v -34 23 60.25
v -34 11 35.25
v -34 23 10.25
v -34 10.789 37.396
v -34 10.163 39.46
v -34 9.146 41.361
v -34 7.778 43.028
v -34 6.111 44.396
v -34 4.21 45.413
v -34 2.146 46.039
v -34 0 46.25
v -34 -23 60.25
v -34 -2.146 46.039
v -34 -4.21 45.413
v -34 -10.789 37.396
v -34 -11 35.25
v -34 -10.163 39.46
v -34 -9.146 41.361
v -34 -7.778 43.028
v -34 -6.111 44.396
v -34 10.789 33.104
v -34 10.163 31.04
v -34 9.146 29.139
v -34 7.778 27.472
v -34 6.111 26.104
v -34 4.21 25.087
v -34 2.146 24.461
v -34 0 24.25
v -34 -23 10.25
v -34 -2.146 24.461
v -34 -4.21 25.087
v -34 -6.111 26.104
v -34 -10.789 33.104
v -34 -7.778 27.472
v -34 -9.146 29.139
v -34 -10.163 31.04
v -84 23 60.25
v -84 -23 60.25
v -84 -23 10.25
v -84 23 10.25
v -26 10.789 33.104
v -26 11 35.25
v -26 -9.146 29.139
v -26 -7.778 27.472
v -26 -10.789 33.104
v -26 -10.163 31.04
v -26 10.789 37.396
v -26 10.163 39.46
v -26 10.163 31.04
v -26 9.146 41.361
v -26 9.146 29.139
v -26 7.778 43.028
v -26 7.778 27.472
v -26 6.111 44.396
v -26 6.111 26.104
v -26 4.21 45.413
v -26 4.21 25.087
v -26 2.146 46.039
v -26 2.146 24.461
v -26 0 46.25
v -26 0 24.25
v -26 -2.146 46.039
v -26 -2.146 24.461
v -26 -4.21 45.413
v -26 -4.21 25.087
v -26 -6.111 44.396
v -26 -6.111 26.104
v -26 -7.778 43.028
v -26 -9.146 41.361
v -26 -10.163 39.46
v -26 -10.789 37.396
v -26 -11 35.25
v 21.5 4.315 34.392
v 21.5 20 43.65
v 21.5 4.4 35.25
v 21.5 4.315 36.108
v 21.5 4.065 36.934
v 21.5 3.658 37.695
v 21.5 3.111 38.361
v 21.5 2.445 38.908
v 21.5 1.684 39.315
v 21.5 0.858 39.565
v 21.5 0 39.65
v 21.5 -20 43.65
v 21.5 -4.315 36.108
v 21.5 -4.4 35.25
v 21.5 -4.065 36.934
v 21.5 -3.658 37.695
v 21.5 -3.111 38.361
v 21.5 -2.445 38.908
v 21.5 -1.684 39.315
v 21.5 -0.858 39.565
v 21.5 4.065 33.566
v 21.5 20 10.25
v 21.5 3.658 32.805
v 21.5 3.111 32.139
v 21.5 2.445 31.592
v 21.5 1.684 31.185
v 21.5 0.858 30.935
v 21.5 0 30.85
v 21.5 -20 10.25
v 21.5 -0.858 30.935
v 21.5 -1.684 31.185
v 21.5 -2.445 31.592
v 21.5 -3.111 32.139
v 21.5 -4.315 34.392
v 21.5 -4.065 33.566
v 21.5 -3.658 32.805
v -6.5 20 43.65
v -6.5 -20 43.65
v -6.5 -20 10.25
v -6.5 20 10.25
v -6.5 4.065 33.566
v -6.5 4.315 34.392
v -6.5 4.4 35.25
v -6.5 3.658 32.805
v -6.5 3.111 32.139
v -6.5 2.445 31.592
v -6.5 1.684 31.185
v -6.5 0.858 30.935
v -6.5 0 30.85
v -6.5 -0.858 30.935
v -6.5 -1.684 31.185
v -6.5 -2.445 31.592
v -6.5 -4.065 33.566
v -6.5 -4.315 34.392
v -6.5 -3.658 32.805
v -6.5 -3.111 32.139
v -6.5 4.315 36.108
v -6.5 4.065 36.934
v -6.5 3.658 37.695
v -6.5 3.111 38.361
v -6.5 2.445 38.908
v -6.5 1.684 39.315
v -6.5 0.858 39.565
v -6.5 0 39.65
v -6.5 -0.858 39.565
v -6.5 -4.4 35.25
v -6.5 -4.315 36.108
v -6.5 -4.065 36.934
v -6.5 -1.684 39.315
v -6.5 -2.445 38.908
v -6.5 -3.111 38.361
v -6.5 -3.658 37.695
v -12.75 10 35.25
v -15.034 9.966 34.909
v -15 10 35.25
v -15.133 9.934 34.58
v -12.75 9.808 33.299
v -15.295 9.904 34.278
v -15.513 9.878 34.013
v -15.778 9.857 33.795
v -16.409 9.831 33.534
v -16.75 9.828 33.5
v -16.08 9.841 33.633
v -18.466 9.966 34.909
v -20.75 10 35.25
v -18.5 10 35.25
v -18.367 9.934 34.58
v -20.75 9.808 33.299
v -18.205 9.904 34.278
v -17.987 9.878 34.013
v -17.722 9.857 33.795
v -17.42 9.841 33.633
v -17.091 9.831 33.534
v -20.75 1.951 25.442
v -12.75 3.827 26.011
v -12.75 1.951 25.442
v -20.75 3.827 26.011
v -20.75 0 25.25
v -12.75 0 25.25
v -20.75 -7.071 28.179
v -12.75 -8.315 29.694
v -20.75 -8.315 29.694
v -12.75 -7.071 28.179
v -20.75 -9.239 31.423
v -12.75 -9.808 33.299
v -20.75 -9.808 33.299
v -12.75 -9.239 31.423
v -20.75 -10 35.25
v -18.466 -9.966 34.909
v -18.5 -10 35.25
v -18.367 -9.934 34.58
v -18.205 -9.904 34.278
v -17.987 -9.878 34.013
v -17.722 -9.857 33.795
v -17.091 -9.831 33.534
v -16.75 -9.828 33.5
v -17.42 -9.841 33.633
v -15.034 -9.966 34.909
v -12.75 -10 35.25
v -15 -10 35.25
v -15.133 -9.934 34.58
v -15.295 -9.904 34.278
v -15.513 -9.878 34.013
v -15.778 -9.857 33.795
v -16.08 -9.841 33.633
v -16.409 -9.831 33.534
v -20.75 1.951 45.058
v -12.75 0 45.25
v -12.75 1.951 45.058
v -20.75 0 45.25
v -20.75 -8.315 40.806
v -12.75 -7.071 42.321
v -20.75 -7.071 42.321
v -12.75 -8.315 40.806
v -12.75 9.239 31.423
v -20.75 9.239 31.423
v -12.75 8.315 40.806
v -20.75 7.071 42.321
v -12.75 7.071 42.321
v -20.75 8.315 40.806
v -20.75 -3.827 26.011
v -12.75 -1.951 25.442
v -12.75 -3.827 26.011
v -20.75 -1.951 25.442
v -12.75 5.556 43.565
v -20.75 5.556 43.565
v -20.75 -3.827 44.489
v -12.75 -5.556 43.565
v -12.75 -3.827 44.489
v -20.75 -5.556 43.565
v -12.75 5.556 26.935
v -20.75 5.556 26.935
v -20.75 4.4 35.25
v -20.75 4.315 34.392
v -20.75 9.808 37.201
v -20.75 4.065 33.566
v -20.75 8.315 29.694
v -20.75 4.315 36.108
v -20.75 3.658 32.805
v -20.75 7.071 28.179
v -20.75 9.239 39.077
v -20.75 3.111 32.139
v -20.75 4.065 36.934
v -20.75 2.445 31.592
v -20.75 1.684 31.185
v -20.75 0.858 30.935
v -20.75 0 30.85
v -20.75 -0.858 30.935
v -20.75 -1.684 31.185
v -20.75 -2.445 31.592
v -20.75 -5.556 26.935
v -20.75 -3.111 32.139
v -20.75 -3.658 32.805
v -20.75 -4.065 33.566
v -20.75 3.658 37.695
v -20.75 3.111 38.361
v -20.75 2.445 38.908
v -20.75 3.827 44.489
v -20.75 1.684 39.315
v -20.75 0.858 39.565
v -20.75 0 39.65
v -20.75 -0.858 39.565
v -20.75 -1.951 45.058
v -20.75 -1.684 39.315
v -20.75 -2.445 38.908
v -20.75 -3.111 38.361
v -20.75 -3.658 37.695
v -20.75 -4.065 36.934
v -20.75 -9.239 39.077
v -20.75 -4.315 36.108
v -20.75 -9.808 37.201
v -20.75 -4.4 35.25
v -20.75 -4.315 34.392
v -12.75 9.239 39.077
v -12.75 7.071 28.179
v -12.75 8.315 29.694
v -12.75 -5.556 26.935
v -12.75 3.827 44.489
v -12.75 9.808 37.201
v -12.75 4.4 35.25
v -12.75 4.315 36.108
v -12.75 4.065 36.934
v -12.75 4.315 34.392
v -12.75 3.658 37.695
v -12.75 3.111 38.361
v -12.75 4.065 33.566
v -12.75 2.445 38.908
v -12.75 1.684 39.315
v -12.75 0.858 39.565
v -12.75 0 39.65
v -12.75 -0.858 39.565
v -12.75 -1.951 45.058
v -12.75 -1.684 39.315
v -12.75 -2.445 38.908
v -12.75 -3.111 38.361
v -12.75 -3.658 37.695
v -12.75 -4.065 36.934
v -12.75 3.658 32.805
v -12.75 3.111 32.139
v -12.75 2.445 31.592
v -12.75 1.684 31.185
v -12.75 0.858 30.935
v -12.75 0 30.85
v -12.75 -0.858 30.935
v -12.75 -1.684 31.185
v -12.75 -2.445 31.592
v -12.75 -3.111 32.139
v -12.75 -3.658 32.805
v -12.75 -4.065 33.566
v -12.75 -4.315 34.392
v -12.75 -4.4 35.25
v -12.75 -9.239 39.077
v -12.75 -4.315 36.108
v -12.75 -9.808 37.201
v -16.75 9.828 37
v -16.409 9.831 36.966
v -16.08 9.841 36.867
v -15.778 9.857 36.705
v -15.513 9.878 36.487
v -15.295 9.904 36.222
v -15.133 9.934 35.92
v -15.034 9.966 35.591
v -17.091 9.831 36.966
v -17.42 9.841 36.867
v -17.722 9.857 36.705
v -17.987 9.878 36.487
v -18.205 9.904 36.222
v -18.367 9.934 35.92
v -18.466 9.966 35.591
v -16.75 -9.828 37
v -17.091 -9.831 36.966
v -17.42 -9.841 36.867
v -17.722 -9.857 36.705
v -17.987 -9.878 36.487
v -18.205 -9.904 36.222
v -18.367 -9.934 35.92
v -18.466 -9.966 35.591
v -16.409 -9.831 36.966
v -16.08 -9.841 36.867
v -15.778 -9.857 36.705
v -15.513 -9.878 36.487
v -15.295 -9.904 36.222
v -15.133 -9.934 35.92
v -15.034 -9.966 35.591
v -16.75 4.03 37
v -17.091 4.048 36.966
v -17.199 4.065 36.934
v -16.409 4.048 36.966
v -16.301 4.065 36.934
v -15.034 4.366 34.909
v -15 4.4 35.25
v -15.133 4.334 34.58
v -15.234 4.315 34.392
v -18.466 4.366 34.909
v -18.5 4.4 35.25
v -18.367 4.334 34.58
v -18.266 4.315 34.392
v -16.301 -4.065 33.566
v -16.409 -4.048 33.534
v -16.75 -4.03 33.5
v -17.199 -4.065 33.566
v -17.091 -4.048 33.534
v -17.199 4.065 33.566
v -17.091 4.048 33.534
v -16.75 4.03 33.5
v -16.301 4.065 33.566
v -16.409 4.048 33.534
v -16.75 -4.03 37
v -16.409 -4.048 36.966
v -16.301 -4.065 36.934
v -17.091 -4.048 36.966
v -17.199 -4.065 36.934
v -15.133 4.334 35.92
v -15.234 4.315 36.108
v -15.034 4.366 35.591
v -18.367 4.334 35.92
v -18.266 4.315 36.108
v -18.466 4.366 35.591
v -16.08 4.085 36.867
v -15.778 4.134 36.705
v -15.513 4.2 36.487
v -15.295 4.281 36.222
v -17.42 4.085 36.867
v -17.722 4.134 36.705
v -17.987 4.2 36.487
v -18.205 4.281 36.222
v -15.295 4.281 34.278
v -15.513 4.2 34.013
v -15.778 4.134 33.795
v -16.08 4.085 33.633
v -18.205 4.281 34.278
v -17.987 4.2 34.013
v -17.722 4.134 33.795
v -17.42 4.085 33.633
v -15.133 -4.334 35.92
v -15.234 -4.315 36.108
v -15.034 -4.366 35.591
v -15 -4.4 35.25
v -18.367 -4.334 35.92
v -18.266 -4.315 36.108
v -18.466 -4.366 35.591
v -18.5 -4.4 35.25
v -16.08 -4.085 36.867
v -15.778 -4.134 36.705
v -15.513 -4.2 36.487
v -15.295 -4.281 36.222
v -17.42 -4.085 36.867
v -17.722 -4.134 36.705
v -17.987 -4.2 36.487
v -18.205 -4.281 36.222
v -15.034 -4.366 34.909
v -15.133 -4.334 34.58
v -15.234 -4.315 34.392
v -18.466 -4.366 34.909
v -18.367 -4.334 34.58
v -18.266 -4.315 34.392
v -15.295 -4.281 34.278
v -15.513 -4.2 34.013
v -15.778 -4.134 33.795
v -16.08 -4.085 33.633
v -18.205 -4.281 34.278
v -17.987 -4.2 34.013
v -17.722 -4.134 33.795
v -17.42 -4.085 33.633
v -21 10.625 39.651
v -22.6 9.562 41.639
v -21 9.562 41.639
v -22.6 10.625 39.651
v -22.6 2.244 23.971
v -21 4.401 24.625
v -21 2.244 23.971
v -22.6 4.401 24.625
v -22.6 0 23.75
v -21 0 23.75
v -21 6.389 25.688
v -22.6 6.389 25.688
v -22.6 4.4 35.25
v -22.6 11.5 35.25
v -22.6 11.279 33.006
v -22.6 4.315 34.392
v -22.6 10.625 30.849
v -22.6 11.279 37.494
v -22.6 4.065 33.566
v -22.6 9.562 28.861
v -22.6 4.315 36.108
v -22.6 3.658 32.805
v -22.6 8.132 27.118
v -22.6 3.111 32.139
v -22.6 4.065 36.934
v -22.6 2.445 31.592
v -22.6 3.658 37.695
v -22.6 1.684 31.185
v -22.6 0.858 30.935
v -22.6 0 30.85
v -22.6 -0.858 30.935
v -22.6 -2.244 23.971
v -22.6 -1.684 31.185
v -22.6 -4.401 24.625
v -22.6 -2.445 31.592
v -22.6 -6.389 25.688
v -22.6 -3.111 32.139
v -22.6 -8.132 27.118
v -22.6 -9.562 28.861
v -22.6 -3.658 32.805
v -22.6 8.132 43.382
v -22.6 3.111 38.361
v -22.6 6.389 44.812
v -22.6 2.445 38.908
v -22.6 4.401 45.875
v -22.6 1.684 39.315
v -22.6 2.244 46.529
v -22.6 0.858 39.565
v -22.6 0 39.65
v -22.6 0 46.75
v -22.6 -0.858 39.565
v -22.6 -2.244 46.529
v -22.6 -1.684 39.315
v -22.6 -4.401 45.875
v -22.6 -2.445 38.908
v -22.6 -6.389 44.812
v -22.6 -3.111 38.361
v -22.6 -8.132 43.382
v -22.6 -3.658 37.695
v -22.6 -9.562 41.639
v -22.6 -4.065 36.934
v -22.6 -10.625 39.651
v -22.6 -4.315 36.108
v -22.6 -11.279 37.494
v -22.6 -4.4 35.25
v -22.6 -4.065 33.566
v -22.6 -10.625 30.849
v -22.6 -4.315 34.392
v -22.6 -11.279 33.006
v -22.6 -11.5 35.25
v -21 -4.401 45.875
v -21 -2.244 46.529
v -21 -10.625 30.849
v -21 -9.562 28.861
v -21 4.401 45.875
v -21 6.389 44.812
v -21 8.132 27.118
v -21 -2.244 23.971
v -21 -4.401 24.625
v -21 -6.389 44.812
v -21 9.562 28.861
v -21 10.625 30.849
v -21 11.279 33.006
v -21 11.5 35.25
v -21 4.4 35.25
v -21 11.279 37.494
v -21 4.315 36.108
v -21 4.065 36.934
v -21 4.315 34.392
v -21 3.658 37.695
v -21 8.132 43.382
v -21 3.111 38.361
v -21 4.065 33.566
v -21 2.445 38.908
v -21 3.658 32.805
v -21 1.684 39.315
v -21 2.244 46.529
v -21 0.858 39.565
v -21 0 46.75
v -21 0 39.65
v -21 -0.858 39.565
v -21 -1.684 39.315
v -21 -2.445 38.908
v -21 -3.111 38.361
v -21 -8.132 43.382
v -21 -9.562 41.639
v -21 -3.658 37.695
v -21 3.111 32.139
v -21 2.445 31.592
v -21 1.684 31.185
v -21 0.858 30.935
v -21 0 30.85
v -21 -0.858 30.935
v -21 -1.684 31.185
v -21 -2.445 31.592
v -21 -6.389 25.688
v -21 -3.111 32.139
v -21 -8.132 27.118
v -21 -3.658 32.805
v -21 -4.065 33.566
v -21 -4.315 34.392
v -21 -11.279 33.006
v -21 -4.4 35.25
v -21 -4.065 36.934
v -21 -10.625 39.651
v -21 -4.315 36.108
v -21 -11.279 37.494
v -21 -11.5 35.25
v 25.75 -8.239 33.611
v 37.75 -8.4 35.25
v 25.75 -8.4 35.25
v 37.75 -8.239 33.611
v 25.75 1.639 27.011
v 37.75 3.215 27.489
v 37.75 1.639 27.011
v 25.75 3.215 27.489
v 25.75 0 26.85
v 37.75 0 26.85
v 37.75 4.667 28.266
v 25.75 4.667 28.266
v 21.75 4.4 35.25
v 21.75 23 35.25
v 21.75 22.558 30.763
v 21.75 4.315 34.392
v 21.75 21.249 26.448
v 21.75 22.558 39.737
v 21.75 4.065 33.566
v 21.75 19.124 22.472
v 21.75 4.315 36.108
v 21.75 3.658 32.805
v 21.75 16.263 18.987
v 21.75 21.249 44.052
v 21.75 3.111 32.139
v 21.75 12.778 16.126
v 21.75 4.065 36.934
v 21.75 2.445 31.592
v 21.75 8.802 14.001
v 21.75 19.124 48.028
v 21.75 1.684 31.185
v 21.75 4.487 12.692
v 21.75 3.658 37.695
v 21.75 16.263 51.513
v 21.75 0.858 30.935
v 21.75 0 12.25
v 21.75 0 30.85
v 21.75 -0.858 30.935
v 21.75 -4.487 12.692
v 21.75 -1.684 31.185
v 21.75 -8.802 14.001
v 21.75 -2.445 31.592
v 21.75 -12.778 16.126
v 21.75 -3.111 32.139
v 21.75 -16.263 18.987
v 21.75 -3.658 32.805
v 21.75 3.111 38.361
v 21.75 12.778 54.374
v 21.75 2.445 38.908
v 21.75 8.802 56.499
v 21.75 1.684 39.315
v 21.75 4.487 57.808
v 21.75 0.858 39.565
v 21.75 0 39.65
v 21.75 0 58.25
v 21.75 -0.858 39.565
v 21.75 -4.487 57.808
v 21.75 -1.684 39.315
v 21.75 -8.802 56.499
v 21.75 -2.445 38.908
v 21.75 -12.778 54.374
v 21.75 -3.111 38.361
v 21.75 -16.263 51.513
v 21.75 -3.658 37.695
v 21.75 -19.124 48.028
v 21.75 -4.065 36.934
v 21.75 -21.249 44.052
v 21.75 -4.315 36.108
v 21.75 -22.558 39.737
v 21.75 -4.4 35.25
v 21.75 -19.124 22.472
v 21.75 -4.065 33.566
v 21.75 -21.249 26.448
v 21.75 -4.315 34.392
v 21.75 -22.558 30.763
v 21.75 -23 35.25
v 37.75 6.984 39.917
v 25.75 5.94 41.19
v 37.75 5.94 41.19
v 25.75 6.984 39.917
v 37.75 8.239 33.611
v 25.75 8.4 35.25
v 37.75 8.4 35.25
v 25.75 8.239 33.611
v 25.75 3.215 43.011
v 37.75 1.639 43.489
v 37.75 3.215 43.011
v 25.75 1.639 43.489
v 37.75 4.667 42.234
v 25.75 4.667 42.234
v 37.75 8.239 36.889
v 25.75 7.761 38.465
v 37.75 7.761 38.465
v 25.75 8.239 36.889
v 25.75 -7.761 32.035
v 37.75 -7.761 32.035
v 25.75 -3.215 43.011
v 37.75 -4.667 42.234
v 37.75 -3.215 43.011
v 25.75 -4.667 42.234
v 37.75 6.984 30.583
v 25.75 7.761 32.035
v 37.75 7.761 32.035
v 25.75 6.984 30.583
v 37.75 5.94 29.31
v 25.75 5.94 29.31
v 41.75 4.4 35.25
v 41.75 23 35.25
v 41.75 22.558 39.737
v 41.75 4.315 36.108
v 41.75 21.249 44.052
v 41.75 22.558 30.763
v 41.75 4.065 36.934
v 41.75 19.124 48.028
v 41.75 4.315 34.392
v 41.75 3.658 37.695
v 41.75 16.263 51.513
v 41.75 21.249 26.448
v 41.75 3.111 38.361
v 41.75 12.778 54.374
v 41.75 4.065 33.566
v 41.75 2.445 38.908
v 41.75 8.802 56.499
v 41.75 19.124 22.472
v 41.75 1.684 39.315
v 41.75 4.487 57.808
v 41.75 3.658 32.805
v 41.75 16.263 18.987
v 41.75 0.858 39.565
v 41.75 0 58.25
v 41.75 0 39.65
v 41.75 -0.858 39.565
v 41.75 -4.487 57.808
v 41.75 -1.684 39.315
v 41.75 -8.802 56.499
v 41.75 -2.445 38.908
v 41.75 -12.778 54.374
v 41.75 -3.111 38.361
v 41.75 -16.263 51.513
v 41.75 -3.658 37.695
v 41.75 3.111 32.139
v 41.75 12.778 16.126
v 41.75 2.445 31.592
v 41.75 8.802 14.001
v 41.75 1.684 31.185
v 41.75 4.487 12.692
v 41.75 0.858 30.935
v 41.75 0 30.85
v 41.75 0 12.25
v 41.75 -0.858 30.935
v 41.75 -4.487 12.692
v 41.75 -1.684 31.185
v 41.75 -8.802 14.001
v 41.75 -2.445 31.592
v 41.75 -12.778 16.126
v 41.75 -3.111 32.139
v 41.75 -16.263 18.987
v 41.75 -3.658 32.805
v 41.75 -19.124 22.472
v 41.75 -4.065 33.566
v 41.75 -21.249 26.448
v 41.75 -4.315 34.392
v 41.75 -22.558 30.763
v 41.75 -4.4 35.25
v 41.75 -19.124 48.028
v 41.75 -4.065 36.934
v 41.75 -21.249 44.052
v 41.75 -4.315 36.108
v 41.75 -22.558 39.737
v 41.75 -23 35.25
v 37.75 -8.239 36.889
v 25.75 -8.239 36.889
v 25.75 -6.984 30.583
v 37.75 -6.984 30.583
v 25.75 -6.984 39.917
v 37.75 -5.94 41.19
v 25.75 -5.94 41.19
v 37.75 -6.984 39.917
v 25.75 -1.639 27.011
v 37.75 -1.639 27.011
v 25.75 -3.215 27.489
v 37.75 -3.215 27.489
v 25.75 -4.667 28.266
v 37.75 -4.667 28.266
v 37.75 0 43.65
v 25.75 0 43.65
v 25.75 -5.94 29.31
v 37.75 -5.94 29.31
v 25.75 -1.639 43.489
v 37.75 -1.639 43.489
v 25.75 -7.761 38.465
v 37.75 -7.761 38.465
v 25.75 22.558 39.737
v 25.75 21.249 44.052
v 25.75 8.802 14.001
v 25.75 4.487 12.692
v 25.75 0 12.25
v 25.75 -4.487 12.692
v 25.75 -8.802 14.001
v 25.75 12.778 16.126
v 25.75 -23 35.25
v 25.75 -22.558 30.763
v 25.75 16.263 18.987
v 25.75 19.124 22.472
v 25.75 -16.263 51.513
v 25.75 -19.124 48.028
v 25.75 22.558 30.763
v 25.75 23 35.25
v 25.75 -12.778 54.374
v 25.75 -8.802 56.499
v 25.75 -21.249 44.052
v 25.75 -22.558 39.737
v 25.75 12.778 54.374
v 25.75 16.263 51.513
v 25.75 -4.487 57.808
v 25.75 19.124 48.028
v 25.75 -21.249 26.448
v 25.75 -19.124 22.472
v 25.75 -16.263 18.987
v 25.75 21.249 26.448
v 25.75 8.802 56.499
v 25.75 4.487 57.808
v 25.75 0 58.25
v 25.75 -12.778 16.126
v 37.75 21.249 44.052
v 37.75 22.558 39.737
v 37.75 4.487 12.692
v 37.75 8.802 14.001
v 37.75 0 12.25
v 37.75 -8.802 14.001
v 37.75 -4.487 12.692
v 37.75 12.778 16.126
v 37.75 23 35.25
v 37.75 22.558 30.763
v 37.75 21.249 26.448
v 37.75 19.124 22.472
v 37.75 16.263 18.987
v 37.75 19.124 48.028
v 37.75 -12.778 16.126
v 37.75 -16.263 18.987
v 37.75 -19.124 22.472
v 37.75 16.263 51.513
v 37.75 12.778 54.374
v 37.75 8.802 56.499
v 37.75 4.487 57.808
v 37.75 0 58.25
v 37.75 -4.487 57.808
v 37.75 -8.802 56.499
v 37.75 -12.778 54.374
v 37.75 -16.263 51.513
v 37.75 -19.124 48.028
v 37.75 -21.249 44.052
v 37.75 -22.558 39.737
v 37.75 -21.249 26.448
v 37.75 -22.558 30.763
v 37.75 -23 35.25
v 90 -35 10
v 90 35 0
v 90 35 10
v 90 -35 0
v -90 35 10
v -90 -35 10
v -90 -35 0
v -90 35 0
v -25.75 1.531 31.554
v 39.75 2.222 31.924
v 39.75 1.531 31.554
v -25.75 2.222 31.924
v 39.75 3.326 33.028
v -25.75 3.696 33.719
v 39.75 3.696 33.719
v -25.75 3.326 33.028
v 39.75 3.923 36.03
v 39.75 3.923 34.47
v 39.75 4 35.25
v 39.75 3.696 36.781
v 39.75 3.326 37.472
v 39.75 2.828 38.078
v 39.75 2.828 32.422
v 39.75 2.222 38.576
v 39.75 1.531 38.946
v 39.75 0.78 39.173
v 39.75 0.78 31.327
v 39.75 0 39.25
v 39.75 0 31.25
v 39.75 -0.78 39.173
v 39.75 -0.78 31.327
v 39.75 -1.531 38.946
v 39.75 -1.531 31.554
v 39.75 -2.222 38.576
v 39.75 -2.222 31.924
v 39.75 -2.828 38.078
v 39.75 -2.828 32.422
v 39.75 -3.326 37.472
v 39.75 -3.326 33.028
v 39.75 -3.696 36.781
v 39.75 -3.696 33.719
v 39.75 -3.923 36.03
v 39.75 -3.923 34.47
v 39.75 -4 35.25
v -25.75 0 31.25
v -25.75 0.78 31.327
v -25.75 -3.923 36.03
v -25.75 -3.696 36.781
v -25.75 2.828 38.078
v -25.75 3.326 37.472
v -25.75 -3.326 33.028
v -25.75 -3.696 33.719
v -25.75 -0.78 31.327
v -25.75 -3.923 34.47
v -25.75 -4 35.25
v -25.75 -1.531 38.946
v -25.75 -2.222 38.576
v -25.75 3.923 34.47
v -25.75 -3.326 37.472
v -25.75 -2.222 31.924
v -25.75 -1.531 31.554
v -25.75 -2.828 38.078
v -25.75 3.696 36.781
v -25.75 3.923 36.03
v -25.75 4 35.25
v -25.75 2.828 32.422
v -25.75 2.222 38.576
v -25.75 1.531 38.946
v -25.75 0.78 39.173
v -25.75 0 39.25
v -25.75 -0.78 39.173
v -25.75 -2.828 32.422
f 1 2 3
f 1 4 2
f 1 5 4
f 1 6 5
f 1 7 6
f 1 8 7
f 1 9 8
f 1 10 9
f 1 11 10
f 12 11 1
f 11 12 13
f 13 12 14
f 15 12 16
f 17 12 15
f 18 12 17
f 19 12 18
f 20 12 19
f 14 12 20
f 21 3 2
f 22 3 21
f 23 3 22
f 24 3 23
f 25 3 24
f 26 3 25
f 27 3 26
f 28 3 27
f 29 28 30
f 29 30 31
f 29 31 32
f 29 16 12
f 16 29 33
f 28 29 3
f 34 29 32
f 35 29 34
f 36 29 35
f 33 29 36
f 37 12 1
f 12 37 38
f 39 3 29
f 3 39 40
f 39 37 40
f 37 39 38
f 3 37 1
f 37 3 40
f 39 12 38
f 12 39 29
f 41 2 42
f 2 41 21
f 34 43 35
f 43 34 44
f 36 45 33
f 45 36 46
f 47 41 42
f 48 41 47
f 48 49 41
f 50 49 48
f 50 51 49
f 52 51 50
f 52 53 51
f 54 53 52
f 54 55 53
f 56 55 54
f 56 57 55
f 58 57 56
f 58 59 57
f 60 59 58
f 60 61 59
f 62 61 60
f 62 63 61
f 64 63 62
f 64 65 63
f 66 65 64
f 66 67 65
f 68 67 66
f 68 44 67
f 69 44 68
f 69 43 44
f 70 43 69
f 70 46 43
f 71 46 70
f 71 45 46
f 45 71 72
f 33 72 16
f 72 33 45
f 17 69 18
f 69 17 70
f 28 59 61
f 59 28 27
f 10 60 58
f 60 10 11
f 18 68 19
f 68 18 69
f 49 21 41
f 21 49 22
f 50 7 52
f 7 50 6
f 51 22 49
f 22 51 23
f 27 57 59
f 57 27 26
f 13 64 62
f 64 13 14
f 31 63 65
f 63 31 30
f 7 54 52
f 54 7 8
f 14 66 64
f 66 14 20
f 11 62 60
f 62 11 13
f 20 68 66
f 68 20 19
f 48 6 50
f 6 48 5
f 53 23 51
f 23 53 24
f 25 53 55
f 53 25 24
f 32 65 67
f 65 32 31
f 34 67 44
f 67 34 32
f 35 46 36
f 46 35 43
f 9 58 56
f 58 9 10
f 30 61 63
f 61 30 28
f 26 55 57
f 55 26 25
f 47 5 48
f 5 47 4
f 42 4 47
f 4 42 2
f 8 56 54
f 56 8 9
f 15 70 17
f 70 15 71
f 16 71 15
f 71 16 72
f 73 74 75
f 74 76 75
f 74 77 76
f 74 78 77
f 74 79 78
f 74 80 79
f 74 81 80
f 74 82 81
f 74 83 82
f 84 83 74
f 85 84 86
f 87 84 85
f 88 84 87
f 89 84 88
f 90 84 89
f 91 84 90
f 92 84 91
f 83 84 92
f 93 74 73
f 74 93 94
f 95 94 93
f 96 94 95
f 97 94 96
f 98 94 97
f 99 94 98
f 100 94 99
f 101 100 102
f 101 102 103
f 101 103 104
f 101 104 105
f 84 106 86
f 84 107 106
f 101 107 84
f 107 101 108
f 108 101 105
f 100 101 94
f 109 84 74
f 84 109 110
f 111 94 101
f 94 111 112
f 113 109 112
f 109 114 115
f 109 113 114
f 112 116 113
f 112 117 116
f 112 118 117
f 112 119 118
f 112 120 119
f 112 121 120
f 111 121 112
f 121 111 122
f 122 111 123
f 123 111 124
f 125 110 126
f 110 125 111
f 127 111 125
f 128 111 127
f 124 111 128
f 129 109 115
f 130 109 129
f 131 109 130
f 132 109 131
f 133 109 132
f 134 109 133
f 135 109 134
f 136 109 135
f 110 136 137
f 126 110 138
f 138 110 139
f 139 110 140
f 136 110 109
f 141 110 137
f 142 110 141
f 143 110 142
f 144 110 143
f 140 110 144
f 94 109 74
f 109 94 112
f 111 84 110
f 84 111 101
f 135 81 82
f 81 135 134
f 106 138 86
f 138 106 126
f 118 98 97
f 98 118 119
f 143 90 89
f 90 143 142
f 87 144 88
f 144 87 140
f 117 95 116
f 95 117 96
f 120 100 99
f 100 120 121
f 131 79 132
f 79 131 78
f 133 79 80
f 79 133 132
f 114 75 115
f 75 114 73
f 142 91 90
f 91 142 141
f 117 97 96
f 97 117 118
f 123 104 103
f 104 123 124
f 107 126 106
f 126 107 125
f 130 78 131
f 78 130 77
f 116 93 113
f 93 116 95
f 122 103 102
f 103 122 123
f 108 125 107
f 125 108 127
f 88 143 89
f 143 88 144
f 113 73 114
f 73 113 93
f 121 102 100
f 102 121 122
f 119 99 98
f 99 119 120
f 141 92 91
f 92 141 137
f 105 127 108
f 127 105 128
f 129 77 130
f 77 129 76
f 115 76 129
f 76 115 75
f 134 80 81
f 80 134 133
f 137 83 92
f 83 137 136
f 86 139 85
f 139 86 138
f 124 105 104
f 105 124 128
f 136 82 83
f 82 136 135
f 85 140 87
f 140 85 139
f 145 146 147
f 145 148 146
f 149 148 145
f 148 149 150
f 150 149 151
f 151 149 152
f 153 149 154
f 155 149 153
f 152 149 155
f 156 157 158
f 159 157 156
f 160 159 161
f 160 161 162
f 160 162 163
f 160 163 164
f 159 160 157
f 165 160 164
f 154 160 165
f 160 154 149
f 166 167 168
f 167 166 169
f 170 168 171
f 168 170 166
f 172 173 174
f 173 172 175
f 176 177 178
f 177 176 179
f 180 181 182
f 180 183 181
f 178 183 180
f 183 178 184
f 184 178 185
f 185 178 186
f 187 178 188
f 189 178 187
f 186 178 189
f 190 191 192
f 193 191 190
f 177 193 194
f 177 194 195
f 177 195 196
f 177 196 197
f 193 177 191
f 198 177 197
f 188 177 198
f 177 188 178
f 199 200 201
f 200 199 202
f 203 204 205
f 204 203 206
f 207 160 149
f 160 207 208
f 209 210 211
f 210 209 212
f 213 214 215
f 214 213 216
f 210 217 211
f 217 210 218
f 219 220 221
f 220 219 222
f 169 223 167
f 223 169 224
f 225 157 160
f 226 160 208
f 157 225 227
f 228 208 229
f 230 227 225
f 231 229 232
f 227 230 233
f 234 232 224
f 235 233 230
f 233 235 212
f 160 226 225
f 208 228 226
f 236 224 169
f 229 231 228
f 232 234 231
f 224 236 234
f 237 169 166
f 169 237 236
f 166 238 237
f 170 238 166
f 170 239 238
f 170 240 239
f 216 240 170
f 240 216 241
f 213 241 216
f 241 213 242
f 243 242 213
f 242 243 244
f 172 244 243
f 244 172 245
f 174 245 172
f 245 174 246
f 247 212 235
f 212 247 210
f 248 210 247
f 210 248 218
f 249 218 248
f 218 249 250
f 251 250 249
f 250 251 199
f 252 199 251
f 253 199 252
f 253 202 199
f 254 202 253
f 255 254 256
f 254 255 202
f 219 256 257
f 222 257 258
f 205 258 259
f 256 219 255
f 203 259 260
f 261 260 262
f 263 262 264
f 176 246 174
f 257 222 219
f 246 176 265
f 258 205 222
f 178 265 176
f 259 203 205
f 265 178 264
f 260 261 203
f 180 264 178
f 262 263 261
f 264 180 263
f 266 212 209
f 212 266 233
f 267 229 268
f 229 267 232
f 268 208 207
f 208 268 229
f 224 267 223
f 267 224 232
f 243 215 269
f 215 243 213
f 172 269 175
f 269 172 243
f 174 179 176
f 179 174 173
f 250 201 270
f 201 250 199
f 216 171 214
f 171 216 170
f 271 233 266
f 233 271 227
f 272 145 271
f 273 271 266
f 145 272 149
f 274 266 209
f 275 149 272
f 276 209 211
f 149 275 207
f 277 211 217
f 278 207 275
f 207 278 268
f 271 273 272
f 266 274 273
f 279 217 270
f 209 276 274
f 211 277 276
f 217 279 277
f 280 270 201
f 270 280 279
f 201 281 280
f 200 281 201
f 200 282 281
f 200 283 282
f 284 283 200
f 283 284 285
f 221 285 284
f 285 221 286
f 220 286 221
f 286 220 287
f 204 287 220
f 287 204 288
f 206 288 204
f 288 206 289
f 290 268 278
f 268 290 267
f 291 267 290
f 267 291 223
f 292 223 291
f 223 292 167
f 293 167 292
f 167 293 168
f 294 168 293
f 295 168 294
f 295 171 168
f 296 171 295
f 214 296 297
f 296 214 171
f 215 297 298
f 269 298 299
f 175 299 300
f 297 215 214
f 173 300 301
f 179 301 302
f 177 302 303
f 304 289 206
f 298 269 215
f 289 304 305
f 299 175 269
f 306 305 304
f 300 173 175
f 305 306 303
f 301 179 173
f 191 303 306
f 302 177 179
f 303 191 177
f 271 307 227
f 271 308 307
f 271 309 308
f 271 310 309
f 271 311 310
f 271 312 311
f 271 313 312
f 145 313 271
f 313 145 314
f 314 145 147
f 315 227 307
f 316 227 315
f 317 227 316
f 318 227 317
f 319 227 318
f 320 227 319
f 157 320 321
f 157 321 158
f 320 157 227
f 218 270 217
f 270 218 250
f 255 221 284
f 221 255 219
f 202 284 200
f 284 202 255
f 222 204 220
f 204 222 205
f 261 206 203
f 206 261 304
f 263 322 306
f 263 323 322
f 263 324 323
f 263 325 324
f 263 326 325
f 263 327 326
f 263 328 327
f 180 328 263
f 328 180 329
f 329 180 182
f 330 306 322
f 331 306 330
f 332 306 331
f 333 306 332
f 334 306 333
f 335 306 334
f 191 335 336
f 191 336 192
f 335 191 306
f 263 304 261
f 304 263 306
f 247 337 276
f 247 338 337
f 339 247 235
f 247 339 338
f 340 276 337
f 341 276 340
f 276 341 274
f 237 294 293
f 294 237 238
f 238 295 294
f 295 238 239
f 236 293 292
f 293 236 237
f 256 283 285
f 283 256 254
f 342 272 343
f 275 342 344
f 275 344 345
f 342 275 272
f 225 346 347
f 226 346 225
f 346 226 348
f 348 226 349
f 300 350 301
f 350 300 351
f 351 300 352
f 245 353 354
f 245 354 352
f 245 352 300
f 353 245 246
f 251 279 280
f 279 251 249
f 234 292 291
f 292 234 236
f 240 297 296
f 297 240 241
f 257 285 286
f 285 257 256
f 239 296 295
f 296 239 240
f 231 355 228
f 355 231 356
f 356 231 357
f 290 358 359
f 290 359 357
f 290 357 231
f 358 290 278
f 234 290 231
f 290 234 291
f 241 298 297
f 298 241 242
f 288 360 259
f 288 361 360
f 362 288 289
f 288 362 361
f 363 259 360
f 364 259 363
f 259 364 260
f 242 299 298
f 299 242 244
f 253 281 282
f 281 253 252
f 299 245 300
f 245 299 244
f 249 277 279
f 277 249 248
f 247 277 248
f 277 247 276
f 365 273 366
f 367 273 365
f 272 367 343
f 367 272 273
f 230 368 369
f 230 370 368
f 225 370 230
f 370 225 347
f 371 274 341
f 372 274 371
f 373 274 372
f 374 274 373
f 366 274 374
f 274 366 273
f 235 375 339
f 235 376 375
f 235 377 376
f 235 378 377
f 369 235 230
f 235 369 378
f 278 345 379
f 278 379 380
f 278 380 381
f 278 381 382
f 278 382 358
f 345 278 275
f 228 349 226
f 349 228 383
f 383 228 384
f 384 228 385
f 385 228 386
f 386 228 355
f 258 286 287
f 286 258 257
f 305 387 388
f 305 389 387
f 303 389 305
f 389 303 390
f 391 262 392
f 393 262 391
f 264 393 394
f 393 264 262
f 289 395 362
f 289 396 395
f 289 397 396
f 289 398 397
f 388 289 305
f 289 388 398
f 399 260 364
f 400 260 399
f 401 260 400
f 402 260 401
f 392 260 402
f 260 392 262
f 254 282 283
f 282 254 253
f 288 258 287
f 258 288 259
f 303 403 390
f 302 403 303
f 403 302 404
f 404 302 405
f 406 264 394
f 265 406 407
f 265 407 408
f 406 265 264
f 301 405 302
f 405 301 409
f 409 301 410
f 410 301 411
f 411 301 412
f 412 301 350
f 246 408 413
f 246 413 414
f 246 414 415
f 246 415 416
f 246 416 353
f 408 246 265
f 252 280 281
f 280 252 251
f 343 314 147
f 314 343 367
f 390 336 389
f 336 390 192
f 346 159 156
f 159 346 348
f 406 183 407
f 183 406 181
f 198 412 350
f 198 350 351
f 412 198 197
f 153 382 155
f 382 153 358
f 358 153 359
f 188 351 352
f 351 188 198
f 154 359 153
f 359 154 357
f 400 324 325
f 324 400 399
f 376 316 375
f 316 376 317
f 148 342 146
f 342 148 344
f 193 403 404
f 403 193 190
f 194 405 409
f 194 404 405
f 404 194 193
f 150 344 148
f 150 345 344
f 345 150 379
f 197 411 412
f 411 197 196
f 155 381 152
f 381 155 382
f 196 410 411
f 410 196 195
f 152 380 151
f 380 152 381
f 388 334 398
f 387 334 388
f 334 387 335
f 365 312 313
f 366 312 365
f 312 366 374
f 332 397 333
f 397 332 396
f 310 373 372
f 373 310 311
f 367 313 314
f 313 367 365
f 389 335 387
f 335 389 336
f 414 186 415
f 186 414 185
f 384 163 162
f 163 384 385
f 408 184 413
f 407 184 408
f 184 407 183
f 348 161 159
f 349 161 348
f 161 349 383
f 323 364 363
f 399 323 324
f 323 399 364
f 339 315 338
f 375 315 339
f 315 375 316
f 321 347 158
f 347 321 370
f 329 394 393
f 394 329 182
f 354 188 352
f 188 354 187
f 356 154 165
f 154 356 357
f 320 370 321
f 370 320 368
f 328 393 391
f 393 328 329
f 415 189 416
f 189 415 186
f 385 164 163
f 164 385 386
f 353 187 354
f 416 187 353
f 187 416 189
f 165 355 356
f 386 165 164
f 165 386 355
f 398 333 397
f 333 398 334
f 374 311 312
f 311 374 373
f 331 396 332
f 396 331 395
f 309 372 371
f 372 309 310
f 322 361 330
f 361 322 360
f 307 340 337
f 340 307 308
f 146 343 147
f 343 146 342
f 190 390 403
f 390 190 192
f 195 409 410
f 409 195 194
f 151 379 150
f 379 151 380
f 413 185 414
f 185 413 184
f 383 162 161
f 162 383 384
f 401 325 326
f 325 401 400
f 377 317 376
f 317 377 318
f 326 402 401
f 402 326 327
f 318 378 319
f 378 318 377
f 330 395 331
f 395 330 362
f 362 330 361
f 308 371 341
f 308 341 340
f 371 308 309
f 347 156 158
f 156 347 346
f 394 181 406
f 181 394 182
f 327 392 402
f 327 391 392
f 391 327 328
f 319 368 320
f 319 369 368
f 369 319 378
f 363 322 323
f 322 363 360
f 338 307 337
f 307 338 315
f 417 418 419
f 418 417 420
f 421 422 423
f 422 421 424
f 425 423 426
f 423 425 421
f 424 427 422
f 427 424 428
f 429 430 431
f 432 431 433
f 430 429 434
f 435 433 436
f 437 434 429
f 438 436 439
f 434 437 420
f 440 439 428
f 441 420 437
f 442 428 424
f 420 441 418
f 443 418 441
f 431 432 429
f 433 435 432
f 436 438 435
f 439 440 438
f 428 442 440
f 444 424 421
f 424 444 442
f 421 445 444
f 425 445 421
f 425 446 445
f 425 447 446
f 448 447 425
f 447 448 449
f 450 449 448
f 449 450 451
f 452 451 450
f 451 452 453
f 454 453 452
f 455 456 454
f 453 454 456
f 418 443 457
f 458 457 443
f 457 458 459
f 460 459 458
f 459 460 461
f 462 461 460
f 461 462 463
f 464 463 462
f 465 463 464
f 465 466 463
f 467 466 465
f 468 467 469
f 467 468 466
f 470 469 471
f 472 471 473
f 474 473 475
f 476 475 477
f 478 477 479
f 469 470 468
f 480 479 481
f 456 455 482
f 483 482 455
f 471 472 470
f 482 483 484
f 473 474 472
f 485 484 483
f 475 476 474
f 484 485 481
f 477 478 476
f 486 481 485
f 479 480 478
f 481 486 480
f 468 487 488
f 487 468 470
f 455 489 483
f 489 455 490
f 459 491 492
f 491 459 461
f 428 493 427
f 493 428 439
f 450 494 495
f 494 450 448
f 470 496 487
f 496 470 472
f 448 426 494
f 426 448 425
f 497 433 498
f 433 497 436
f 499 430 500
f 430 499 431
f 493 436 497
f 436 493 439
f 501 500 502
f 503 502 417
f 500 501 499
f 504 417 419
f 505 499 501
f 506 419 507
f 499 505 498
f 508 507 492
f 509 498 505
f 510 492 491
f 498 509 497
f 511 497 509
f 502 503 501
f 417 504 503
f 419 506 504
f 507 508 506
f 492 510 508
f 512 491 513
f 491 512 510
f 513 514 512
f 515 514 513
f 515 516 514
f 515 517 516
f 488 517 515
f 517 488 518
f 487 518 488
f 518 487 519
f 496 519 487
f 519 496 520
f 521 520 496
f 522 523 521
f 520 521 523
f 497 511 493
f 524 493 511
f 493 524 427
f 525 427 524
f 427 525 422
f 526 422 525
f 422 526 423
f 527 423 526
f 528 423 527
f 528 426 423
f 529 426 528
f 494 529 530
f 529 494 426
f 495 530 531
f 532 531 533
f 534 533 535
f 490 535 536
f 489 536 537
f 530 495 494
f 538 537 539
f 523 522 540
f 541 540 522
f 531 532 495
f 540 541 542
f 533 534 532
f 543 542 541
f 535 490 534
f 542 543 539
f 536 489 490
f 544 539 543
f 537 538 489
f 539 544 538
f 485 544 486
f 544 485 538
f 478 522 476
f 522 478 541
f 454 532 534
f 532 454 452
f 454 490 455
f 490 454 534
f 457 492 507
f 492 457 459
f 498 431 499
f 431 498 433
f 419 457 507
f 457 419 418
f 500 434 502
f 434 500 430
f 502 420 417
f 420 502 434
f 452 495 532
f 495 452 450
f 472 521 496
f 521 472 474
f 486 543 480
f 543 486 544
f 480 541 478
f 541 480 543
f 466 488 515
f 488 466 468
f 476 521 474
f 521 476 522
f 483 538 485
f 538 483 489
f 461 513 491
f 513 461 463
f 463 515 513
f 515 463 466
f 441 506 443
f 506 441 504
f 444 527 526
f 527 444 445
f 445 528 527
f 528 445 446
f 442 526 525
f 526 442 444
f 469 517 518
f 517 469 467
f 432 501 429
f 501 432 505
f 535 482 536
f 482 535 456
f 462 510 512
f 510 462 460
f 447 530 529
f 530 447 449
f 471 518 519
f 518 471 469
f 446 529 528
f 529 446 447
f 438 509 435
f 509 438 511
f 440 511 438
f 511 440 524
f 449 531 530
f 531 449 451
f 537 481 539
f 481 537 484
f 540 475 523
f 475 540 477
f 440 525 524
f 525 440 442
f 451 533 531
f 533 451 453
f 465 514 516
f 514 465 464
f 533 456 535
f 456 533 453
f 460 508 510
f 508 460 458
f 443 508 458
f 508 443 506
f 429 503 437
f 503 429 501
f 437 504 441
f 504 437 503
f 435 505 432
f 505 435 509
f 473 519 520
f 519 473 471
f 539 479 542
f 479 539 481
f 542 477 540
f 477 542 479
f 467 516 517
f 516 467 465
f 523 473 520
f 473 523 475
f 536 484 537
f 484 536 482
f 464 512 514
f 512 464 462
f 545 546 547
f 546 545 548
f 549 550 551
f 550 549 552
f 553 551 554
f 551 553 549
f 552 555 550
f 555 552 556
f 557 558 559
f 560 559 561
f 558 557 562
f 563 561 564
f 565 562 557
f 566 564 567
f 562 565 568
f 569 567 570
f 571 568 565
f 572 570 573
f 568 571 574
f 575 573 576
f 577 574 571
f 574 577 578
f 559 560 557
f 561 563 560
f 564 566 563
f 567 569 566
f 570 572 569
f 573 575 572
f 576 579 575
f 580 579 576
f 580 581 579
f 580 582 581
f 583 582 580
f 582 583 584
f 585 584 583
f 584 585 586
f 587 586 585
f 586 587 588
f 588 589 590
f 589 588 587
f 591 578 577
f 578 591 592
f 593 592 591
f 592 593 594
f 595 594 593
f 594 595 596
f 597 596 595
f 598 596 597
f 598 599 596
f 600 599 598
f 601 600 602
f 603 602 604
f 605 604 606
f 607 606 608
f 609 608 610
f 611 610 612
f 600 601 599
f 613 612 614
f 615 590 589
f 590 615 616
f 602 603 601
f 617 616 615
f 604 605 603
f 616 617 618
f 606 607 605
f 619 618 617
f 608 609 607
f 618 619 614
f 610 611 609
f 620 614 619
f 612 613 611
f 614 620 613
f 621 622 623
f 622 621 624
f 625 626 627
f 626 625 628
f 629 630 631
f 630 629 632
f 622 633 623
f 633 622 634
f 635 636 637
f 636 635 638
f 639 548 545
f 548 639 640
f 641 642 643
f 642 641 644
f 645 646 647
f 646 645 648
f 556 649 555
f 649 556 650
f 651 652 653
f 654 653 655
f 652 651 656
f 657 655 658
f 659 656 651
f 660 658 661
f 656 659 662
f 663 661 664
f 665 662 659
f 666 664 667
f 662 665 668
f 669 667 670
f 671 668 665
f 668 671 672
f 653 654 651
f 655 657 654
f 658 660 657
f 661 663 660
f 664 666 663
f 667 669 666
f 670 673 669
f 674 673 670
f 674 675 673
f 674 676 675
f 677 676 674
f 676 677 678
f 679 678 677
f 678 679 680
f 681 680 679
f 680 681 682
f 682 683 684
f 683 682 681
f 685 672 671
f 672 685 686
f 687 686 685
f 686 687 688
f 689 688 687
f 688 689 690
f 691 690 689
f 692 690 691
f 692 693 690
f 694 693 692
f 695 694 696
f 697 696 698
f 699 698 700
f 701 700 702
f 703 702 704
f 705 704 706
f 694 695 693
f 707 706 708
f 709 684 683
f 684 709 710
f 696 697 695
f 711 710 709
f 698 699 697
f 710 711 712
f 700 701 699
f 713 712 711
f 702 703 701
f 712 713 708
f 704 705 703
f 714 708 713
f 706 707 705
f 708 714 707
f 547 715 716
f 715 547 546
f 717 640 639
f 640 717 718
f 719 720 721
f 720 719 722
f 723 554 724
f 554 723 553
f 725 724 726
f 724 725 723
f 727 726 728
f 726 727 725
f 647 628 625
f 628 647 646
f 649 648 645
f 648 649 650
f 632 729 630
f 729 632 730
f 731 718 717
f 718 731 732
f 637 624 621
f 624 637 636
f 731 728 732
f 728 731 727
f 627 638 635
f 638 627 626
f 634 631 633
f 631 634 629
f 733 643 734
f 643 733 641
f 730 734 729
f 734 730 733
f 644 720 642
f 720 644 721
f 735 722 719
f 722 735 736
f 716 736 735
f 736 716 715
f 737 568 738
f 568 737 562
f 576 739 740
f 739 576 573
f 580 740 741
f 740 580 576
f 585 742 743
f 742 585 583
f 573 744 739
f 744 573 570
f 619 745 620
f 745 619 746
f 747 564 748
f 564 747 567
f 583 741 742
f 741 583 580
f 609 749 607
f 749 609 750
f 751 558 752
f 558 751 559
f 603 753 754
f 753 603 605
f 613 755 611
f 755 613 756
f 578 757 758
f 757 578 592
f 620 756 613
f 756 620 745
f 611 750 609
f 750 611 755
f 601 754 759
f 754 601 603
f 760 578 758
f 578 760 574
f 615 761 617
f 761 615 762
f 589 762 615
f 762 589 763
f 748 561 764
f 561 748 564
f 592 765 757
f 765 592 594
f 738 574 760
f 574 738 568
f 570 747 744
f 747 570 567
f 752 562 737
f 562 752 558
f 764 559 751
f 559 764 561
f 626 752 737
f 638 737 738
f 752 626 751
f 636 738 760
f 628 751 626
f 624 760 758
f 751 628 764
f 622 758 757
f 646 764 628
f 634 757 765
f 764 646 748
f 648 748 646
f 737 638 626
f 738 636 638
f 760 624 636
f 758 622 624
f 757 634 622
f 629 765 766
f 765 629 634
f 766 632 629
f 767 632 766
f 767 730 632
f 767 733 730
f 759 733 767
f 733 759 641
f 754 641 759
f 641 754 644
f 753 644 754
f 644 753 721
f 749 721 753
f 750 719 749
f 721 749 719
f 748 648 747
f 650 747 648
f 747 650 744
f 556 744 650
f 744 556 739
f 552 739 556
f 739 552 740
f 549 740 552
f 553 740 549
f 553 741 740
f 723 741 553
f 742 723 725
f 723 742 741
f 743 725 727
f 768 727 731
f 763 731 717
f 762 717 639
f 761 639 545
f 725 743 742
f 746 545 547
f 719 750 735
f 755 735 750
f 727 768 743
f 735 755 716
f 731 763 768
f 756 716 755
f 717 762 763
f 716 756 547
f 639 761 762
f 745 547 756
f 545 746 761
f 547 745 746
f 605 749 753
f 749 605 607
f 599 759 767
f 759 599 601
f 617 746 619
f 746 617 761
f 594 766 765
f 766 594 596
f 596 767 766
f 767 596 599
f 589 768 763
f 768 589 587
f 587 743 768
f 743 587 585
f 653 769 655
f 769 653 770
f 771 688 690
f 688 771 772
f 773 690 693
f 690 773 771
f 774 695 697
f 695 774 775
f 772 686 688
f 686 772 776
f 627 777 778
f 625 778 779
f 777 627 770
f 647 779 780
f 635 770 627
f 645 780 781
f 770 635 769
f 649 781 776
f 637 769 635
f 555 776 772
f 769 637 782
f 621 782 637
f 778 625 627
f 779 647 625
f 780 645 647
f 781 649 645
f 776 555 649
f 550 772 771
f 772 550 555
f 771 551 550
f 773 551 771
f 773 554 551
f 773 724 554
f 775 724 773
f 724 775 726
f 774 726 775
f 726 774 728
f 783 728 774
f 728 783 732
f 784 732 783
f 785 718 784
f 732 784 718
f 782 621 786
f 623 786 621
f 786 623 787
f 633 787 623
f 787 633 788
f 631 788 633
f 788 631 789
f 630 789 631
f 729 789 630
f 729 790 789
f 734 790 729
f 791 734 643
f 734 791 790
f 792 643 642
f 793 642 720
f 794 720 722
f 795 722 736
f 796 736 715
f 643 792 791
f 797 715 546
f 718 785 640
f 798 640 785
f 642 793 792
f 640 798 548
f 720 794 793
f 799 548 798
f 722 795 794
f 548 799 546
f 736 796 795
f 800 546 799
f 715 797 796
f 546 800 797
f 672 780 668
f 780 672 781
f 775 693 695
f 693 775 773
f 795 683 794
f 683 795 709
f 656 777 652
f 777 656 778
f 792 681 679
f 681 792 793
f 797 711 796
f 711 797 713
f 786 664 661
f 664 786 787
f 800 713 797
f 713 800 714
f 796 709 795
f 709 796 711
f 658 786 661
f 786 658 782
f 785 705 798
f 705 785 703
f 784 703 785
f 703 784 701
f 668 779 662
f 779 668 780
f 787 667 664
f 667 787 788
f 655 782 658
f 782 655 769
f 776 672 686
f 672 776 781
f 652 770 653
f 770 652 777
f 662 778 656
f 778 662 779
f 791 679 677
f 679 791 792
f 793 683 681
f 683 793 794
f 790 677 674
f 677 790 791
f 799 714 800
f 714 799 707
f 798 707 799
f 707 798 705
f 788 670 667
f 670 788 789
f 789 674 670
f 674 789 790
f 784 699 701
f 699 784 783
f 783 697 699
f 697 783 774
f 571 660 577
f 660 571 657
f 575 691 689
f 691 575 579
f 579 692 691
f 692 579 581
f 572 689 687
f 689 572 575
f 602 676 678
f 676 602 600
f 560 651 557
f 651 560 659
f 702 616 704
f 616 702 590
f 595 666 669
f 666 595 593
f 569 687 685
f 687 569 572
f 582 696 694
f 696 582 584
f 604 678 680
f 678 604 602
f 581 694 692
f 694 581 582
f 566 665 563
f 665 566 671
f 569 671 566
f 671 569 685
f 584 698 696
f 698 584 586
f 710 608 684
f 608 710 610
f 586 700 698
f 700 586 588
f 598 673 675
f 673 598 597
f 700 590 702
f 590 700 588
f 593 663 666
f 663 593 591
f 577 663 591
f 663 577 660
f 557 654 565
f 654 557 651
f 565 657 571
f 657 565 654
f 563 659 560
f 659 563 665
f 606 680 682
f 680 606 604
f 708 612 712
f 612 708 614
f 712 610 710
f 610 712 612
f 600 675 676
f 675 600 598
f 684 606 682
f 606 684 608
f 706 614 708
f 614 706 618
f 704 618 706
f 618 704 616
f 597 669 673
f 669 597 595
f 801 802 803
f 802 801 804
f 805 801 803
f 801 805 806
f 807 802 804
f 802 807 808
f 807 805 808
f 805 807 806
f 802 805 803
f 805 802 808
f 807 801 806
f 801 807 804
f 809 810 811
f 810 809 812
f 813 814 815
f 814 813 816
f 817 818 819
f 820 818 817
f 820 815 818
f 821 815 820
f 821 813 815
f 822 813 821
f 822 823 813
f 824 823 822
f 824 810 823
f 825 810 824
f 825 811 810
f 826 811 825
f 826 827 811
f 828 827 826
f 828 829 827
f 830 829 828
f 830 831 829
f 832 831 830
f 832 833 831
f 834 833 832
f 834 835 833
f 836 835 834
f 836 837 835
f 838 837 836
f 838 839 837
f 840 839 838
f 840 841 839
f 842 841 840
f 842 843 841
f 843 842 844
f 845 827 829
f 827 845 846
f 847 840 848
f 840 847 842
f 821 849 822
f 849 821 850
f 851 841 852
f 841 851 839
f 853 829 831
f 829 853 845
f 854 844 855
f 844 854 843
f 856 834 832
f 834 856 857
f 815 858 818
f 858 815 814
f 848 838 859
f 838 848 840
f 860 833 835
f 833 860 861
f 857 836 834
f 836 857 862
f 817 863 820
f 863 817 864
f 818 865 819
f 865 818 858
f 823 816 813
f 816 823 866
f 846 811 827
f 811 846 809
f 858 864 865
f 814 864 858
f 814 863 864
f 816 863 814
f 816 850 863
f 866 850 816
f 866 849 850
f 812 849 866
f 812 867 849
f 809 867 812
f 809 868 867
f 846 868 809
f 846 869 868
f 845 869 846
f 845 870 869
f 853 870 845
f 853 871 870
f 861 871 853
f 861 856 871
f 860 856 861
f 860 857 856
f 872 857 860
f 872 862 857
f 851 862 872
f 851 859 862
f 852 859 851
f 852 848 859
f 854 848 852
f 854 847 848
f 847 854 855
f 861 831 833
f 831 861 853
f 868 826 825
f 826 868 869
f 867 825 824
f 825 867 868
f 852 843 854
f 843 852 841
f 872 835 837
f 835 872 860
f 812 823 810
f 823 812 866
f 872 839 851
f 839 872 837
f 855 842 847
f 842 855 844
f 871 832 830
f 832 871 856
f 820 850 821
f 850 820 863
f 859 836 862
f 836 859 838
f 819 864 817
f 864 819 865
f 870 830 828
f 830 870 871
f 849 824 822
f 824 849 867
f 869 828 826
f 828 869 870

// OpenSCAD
$fn = 32;

// ------------------------------------------------------------------------
// Motor drive station: motor 50 x 50 mm, shaft d8, pulley d46
// Every part is its own module, assembly() places every instance.
// ------------------------------------------------------------------------

// --- part 1 ---
module station_bed() {
  difference() {
    translate([-90, -35, 0]) cube([180, 70, 10]);
  }
}

// --- part 2 ---
module drive_motor() {
  union() {
    translate([-25, -23, 0]) cube([50, 46, 50]);
    translate([29, 0, 25]) rotate([0, 90, 0]) cylinder(h = 8, d = 22, center = true);
  }
}

// --- part 3 ---
module pillow_block() {
  difference() {
    translate([-14, -20, 0]) cube([28, 40, 33.4]);
    translate([0, 0, 25]) rotate([0, 90, 0]) cylinder(h = 30, d = 8.8, center = true);
  }
}

// --- part 4 ---
module drive_shaft() {
  translate([0, 0, -32.75]) cylinder(h = 65.5, d = 8);
}

// --- part 5 ---
module shaft_collar() {
  difference() {
    cylinder(h = 8, d = 20);
    translate([0, 0, -1]) cylinder(h = 10, d = 8.8);
    translate([0, 0, 4]) rotate([90, 0, 0]) cylinder(h = 22, d = 3.5, center = true);
  }
}

// --- part 6 ---
module collar_washer() {
  difference() {
      translate([0, 0, 0]) cylinder(h = 1.6, d = 23);
      translate([0, 0, -1]) cylinder(h = 3.6, d = 8.8);
    }
}

// --- part 7 ---
module drive_pulley() {
  difference() {
    union() {
      cylinder(h = 20, d = 16.8);
      cylinder(h = 4, d = 46);
      translate([0, 0, 16]) cylinder(h = 4, d = 46);
    }
    translate([0, 0, -1]) cylinder(h = 22, d = 8.8);
  }
}

// --- assembly ---
module assembly() {
  color([0.80, 0.24, 0.20]) translate([0, 0, 0]) rotate([0, 0, 0]) station_bed();
  color([0.20, 0.45, 0.75]) translate([-59, 0, 10.25]) rotate([0, 0, 0]) drive_motor();
  color([0.25, 0.62, 0.32]) translate([7.5, 0, 10.25]) rotate([0, 0, 0]) pillow_block();
  color([0.92, 0.70, 0.18]) translate([7, 0, 35.25]) rotate([0, 90, 0]) drive_shaft();
  color([0.58, 0.35, 0.70]) translate([-20.75, 0, 35.25]) rotate([0, 90, 0]) shaft_collar();
  color([0.16, 0.66, 0.66]) translate([-22.6, 0, 35.25]) rotate([0, 90, 0]) collar_washer();
  color([0.85, 0.48, 0.18]) translate([21.75, 0, 35.25]) rotate([0, 90, 0]) drive_pulley();
}

assembly();
